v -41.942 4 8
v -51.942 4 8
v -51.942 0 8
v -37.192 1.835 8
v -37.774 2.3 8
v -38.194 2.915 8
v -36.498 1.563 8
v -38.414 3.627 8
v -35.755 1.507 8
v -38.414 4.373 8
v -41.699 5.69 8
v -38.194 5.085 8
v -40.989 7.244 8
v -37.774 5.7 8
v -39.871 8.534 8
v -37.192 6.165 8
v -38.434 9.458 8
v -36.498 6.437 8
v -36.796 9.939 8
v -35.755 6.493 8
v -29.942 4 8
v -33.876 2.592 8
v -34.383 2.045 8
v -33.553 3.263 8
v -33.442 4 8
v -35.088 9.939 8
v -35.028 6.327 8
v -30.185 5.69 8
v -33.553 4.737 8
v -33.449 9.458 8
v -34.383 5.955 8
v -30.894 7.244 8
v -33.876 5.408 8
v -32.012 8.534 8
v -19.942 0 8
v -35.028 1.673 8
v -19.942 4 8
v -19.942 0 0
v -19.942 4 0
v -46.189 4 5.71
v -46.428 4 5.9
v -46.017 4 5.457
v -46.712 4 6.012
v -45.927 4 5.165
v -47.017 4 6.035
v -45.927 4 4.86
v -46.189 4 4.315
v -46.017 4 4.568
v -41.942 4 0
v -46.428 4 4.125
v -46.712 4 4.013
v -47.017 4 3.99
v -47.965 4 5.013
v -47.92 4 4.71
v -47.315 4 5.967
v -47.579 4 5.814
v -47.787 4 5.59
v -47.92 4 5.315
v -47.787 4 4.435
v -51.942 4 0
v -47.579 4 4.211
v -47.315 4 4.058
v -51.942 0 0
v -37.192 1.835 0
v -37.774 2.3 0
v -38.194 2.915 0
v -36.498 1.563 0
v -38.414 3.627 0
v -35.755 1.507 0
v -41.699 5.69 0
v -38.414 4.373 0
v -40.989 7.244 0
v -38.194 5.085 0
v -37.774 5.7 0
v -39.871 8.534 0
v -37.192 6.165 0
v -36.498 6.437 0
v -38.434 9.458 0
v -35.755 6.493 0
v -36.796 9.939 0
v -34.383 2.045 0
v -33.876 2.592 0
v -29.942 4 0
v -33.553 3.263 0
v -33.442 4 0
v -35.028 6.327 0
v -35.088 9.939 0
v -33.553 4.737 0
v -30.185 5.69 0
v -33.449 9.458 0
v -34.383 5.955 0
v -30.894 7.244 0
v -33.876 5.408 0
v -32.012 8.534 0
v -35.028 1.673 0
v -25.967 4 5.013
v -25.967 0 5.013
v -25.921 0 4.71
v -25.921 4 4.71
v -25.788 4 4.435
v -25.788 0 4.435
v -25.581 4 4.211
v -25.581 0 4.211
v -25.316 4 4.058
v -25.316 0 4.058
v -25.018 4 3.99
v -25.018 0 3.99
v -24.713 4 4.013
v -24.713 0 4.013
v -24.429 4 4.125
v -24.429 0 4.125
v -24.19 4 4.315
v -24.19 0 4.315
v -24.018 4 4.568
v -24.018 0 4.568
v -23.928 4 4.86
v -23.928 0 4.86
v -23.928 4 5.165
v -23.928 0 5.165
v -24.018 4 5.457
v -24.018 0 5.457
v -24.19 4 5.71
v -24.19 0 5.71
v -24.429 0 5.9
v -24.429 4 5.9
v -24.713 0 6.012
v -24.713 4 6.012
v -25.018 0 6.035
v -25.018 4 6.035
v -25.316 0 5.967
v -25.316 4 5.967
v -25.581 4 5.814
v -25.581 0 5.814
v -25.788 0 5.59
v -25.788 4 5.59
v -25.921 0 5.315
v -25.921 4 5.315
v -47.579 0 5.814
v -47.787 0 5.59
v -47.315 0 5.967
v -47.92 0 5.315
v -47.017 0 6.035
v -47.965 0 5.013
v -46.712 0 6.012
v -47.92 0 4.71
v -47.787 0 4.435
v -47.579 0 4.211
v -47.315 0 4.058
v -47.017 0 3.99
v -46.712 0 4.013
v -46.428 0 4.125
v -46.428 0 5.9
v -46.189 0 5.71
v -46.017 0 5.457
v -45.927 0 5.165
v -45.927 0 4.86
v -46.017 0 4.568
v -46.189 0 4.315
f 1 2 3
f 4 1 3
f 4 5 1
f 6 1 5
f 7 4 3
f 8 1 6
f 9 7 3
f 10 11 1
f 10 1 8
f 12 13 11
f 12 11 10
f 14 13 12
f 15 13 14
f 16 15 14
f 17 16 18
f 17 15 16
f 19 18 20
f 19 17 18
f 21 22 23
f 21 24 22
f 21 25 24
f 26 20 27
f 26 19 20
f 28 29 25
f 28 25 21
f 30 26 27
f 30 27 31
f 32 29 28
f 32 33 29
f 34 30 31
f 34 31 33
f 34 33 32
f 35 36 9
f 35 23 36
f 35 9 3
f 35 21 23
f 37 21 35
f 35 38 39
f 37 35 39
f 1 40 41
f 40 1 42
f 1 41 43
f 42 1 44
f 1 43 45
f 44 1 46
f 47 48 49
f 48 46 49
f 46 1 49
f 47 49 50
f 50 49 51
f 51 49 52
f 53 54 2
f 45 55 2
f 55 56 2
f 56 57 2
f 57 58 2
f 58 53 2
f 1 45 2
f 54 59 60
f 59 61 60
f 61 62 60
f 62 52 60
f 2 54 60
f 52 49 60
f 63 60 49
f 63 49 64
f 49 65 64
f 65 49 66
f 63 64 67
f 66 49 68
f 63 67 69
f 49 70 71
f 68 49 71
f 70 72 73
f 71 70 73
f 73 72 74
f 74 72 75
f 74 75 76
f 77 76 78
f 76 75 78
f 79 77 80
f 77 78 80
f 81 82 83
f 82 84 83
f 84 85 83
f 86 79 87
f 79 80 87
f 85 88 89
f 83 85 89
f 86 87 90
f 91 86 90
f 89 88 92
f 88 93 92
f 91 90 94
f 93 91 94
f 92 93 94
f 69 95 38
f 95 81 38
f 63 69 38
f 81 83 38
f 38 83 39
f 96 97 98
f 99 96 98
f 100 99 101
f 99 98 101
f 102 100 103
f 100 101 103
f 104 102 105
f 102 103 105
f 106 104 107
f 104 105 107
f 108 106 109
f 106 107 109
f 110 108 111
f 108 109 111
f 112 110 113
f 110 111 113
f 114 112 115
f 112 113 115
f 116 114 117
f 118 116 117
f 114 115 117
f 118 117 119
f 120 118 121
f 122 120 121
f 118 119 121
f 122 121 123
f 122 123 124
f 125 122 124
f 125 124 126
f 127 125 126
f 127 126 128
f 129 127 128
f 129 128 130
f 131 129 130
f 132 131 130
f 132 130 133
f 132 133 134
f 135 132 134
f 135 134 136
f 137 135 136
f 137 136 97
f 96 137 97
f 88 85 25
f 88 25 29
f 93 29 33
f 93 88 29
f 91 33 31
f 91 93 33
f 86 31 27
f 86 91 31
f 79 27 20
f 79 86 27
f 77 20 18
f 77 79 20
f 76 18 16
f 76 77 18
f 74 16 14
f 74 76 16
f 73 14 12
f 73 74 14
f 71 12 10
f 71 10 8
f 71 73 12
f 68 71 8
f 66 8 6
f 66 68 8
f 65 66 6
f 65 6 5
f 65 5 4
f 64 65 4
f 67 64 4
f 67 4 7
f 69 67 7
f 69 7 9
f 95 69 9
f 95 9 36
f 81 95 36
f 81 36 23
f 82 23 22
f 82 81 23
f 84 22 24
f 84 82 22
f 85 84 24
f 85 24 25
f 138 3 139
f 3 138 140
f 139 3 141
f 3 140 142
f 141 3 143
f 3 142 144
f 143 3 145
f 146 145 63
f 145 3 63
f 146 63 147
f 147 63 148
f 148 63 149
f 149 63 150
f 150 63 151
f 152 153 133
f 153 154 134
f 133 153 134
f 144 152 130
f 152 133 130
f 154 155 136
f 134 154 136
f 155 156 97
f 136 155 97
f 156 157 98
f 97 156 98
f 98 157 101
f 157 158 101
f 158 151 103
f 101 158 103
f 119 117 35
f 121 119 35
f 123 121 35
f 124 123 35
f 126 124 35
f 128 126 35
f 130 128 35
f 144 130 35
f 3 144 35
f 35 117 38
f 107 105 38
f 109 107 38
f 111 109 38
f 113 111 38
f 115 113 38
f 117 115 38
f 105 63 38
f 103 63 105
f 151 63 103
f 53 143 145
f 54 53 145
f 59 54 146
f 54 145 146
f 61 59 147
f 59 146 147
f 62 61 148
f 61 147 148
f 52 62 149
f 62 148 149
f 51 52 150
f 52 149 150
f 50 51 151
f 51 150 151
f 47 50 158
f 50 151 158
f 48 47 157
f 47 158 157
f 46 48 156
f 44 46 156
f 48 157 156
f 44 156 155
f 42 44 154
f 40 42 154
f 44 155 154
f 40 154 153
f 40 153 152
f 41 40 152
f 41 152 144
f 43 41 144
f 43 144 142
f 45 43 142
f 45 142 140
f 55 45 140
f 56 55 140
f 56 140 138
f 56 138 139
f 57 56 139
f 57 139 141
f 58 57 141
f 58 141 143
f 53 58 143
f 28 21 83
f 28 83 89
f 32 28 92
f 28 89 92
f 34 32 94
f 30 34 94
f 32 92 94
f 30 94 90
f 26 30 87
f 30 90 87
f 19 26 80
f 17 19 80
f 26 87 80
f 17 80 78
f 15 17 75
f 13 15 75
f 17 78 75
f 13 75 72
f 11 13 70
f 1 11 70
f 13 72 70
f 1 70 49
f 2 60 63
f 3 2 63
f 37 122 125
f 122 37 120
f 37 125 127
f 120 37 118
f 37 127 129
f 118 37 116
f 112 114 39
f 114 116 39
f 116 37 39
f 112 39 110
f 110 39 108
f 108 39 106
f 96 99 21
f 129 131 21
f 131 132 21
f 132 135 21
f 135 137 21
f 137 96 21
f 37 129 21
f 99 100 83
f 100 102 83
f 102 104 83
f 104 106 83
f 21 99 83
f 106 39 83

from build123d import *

# Parameters (mm, degrees)
CROQUIS1_R                                     = 2.5
SALIENTE_EXTRUIR1_DEPTH                        = 8
PERFORADOR_PARA_ROSCAR_PARA_MACHO_DE_ROS_D     = 2.05
PERFORADOR_PARA_ROSCAR_PARA_MACHO_DE_ROS_DEPTH = 10
PERFORADOR_PARA_ROSCAR_PARA_MACHO_DE_ROS_TIP   = 0.615882135


with BuildPart() as part:
    # Croquis1 → Saliente-Extruir1 (new body)
    with BuildSketch(Plane.XY):
        with BuildLine():
            Line((-51.94164691, 0), (-19.94164691, 0))
            Line((-19.94164691, 0), (-19.94164691, 4))
            Line((-19.94164691, 4), (-29.94164691, 4))
            ThreePointArc((-29.94164691, 4), (-35.94164691, 10), (-41.94164691, 4))
            Line((-41.94164691, 4), (-51.94164691, 4))
            Line((-51.94164691, 4), (-51.94164691, 0))
        make_face()
        with Locations((-35.94164691, 4)):
            Circle(CROQUIS1_R, mode=Mode.SUBTRACT)
    extrude(amount=SALIENTE_EXTRUIR1_DEPTH)

    # Perforador para roscar para macho de roscar para M2.5x0.451
    with Locations(Plane(origin=(0, 4, 0), x_dir=(1, 0, 0), z_dir=(0, 1, 0))):
        with Locations((-46.940104762, -5.012552849), (-24.941517603, -5.012552849)):
            Hole(PERFORADOR_PARA_ROSCAR_PARA_MACHO_DE_ROS_D / 2, depth=PERFORADOR_PARA_ROSCAR_PARA_MACHO_DE_ROS_DEPTH)
            with Locations((0, 0, -(PERFORADOR_PARA_ROSCAR_PARA_MACHO_DE_ROS_DEPTH + PERFORADOR_PARA_ROSCAR_PARA_MACHO_DE_ROS_TIP / 2))):  # 118° drill point
                Cone(0, PERFORADOR_PARA_ROSCAR_PARA_MACHO_DE_ROS_D / 2, PERFORADOR_PARA_ROSCAR_PARA_MACHO_DE_ROS_TIP, mode=Mode.SUBTRACT)


solid = part.part
